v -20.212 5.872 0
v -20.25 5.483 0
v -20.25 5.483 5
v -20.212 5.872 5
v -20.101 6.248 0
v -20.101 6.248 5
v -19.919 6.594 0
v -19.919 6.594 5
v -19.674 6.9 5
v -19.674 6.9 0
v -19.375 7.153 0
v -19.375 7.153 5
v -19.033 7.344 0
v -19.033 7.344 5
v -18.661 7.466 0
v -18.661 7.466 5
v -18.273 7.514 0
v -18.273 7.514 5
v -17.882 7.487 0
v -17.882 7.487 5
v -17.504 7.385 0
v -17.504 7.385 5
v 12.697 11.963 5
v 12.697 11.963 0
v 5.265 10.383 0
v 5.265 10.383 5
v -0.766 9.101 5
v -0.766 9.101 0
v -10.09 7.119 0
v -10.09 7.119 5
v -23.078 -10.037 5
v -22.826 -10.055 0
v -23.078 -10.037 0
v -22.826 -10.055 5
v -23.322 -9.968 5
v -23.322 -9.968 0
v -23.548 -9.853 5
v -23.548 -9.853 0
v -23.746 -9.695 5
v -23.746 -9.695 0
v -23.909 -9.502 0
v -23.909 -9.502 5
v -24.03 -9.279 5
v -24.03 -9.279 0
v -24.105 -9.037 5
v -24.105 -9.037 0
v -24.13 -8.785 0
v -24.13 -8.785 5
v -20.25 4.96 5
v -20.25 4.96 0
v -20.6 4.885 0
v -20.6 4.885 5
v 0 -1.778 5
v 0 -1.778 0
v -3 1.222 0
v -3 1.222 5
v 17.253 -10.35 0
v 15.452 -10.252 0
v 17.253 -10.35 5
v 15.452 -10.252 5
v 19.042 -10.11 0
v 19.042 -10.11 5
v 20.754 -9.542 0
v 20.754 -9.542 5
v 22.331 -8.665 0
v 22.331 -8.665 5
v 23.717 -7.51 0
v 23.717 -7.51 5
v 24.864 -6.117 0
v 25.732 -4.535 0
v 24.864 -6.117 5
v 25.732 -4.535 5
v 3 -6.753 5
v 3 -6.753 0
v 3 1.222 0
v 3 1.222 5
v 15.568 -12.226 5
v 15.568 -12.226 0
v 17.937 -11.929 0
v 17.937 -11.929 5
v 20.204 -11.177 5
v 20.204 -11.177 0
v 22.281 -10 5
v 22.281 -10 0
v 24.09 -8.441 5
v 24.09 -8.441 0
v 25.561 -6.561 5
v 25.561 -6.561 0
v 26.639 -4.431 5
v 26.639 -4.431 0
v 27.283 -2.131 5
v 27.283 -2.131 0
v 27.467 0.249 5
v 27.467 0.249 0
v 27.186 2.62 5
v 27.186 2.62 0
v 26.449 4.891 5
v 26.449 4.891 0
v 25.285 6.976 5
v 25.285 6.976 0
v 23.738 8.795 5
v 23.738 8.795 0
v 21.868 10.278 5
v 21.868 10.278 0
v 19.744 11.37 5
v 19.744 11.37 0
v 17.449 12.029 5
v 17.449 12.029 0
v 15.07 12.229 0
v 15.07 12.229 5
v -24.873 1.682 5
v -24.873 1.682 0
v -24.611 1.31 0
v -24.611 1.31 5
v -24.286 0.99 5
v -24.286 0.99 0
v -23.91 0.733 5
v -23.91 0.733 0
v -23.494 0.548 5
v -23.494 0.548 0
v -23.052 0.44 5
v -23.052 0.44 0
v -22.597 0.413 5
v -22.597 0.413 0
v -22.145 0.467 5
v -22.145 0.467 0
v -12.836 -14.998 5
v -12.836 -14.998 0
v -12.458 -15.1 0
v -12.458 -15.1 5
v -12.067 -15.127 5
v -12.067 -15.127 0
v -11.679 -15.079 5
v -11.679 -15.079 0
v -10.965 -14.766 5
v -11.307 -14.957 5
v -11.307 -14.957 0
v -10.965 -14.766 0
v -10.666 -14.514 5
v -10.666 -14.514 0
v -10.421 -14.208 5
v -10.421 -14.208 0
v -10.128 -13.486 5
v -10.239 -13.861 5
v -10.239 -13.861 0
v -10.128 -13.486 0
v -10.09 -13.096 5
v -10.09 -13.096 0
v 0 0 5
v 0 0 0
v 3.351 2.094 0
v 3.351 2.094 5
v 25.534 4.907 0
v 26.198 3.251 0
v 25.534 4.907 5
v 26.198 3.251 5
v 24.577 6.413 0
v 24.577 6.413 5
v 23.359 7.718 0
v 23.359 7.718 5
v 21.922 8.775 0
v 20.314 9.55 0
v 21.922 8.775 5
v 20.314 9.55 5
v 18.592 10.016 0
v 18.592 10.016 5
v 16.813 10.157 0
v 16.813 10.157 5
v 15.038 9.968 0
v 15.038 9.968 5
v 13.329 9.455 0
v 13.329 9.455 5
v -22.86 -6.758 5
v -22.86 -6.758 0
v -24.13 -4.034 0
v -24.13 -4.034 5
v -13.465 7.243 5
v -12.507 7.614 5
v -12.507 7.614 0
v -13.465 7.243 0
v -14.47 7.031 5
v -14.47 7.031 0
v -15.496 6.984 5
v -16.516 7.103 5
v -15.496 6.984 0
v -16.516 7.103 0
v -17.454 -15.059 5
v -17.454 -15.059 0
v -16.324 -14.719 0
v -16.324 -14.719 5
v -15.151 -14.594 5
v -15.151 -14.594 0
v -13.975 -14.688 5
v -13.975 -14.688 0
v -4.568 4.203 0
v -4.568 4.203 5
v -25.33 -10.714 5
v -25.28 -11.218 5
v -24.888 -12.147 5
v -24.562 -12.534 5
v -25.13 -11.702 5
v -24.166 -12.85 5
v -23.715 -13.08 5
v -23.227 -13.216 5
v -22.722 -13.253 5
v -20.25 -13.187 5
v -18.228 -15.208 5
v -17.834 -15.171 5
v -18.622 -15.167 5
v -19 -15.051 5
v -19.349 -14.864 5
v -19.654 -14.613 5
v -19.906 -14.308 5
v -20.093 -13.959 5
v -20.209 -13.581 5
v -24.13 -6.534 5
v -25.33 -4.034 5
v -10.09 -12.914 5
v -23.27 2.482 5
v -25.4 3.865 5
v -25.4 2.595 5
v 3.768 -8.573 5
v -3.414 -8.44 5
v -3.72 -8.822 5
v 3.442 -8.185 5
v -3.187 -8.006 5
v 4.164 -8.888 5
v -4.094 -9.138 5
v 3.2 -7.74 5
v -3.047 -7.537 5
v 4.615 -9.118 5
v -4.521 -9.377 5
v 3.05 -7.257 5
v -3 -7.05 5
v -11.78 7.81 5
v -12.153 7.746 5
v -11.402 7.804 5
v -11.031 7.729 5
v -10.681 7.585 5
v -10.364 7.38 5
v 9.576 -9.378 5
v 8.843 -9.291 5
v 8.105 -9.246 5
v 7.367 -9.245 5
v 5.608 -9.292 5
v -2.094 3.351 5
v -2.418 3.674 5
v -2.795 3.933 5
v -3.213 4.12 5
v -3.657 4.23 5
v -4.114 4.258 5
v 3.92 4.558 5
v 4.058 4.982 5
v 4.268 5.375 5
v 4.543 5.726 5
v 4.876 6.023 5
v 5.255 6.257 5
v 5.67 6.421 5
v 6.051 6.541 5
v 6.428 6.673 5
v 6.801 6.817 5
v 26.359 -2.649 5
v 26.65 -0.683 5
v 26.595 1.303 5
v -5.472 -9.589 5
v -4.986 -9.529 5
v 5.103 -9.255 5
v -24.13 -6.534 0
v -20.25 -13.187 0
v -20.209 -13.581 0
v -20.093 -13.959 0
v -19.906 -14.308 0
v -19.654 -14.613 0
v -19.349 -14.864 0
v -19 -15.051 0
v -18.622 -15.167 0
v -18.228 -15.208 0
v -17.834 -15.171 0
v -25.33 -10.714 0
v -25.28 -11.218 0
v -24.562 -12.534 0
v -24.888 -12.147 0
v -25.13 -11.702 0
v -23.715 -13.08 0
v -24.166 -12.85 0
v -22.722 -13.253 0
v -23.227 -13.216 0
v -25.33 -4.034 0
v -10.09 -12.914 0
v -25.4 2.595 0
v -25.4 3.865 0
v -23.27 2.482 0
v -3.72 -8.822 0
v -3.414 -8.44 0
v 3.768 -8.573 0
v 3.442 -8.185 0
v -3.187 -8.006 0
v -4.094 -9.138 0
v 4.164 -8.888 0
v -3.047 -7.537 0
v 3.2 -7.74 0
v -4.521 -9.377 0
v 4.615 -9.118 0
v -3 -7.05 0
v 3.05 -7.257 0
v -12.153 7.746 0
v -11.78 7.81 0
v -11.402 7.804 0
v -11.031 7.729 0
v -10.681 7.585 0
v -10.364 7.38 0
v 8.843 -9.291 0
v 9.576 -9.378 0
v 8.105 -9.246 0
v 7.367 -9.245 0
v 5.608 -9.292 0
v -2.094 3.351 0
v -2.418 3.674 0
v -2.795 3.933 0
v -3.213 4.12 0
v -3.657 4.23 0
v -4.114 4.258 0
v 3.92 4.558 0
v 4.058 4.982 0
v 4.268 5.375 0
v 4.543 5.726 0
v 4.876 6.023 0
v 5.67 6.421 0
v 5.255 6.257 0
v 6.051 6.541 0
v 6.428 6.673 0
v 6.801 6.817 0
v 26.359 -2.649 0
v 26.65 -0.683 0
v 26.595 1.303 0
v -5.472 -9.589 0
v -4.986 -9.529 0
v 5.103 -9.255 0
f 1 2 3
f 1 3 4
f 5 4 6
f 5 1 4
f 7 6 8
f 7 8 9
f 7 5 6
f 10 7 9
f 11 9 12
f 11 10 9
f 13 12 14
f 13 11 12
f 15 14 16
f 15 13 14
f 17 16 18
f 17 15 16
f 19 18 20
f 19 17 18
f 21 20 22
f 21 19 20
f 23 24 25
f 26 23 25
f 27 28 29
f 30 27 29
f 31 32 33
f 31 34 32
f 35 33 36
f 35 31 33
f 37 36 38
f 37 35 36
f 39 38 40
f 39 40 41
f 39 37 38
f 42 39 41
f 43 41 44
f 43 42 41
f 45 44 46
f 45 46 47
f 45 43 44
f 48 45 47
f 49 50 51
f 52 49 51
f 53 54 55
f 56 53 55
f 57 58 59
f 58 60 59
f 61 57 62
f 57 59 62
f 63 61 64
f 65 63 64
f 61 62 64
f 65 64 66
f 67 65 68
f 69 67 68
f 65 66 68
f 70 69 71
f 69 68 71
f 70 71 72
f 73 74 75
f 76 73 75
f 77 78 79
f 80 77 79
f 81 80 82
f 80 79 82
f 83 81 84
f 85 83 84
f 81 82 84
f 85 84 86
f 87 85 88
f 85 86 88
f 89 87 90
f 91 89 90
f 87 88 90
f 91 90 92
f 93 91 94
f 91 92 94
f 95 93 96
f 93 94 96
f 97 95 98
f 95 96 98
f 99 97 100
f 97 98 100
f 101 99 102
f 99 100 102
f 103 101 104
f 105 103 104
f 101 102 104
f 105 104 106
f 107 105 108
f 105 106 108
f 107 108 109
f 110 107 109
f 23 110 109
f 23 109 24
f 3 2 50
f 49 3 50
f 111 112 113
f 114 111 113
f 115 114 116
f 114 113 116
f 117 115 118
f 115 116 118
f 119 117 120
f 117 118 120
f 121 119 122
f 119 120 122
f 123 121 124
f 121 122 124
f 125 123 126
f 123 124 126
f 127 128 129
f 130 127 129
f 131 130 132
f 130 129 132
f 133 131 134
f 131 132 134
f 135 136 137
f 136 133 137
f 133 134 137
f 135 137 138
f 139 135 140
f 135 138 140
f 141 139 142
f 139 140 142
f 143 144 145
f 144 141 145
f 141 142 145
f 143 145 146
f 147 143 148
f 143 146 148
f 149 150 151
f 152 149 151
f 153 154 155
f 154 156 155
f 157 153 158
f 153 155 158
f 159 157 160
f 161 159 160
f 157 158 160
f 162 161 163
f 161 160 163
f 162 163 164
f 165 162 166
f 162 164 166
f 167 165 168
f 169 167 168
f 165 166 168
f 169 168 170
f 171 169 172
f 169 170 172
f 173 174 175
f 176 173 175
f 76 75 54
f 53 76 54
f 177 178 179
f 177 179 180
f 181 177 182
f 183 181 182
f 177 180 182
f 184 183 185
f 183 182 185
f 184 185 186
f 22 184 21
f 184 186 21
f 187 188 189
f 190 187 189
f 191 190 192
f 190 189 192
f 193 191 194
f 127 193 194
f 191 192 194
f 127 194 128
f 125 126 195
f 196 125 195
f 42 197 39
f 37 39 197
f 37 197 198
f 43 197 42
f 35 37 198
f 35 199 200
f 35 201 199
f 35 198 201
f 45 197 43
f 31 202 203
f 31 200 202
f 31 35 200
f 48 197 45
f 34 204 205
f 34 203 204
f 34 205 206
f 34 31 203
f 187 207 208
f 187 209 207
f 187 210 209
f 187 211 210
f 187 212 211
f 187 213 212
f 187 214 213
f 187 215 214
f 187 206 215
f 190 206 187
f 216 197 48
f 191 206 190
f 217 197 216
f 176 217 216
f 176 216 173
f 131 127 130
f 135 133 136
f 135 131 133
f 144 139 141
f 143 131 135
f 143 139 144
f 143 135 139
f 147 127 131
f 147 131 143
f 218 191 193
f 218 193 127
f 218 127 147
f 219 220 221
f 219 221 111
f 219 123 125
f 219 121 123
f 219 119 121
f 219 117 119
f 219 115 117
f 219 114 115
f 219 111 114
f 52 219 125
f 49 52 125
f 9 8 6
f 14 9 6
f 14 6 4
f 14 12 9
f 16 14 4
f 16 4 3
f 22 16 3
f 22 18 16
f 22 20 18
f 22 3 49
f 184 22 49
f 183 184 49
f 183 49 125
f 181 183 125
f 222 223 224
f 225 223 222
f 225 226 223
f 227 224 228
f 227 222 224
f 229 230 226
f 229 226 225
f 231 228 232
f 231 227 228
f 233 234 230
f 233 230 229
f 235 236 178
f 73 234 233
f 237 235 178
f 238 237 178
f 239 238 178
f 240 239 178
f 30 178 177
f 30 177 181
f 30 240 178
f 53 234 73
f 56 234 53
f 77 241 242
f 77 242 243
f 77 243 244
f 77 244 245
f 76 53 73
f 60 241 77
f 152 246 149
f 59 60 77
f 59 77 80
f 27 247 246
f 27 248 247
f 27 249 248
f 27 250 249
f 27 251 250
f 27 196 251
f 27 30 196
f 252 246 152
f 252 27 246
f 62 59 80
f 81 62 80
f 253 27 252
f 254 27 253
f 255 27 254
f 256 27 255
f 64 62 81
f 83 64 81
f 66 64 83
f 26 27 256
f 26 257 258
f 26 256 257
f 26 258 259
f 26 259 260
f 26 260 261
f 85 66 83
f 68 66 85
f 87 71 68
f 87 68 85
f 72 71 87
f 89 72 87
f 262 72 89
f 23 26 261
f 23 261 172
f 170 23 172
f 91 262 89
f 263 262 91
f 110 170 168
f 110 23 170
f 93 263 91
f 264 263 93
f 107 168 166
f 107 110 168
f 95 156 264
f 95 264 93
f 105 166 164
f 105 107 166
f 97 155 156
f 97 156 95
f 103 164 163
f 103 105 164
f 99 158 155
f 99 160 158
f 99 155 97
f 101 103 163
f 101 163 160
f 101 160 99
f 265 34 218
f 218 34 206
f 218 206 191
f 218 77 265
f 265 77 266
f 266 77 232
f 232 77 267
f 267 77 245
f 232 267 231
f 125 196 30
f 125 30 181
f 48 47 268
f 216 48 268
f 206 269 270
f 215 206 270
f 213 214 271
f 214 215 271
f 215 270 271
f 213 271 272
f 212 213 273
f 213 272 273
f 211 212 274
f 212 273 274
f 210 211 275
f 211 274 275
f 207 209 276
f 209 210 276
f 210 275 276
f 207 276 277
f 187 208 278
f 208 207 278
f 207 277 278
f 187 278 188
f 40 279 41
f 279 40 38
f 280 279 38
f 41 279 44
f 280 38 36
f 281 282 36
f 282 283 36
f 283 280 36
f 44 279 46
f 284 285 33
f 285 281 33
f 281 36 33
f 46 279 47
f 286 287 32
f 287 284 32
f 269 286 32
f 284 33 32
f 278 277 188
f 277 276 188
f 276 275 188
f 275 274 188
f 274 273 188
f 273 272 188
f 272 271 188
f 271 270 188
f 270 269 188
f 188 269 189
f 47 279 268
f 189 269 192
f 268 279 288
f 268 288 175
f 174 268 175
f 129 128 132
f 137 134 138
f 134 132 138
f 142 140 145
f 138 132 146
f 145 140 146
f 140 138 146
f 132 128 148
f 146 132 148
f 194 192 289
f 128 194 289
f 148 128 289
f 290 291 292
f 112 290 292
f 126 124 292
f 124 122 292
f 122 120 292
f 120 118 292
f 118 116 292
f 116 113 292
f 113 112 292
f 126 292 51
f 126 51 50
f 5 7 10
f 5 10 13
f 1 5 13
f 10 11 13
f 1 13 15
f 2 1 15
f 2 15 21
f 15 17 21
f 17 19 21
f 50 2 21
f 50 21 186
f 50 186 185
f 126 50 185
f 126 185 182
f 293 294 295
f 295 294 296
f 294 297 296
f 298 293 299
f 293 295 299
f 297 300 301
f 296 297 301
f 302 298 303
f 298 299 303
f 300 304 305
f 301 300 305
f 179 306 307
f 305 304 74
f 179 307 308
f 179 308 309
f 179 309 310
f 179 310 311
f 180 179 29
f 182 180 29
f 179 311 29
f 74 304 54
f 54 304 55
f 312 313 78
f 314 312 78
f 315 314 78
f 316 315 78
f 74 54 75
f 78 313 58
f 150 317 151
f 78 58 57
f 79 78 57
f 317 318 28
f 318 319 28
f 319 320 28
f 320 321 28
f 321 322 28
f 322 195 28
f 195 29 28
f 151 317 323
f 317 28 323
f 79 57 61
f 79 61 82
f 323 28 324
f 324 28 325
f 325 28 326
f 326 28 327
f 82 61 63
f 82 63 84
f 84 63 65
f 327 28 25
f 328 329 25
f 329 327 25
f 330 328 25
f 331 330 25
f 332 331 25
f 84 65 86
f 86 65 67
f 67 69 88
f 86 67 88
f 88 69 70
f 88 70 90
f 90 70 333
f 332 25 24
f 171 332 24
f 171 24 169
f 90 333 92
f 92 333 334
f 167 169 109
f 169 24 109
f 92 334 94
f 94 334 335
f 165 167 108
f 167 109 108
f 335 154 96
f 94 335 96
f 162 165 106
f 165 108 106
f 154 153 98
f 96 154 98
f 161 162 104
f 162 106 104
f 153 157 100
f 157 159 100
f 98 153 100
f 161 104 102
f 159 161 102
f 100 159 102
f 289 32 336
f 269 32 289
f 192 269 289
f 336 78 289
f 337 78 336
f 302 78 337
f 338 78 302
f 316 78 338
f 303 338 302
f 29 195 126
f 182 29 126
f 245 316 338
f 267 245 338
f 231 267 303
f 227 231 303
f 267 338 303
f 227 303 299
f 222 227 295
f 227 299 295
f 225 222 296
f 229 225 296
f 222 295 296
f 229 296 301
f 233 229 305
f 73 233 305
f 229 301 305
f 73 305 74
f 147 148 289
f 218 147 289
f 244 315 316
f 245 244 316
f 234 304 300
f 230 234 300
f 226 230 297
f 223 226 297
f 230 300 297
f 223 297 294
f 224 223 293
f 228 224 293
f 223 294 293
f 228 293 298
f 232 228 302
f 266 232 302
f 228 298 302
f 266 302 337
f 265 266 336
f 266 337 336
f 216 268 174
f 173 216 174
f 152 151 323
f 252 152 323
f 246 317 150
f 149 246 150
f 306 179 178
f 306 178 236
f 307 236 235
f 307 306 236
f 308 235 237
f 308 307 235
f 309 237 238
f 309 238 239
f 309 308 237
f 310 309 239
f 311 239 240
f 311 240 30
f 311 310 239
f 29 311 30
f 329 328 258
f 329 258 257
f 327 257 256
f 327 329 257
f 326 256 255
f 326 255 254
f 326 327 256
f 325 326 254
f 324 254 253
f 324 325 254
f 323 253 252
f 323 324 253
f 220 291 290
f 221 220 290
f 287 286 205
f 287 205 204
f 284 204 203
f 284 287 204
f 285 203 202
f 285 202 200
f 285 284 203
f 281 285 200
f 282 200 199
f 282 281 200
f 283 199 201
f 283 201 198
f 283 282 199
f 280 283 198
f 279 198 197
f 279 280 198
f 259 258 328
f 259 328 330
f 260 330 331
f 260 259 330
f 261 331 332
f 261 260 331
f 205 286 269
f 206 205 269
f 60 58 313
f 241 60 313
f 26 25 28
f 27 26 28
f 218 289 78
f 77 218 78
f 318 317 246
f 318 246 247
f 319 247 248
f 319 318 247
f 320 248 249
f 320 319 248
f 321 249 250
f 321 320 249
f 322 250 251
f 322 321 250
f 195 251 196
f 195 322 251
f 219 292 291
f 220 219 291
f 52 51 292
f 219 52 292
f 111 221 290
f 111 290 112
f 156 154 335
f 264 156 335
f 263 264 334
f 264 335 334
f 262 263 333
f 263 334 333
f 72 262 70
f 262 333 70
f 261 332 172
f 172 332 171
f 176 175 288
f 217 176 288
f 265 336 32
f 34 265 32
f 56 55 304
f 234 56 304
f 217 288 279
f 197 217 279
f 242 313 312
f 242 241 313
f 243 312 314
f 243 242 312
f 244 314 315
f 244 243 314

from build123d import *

# Parameters (mm, degrees)
F1_DEPTH     = 5
F2_R         = 12.7
F3_T1_DEPTH  = 5
F3_T3_DEPTH  = 5
F3_T5_DEPTH  = 5
F3_T7_DEPTH  = 5
F3_T9_DEPTH  = 14.2270901057
F3_T11_DEPTH = 18.0454684025
F4_R         = 1.27
F5_R         = 9.652
F6_T1_DEPTH  = 24.5237287856
F6_T3_DEPTH  = 20.8349691576
F6_T5_DEPTH  = 25.4326352389


# Not quite as in the source:
# - a fillet or chamfer that OpenCascade refuses, or shapes differently, is made with other operations: its cross-section is extruded or revolved along the edge and cut away or added


with BuildPart() as f1:
    # F0 (on Top) → F1 (new body)
    with BuildSketch(Plane.XY):
        Polygon((3.3509032068, 2.0938767152), (4.2717468935, 6.0824889279), (5.2645709983, 10.3828825854), (-0.7663700033, 9.1009665025), (-1.7591941081, 4.800572845), (-2.0938767152, 3.3509032068), (0, 0), align=None)
        with BuildLine():
            ThreePointArc((19.0271173058, -10.7843702882), (13.5579507926, -11.3055566189), (8.4773948837, -9.2147746604))
            Line((8.4773948837, -9.2147746604), (3, -9.3617991862))
            Line((3, -9.3617991862), (-3, -9.5228515064))
            Line((-3, -9.5228515064), (-24.13, -10.0900240941))
            Line((-24.13, -10.0900240941), (-24.13, -6.5340240941))
            Line((-24.13, -6.5340240941), (-24.13, -4.0344355705))
            Line((-24.13, -4.0344355705), (-25.33, -4.0344355705))
            Line((-25.33, -4.0344355705), (-25.33, -13.3233871439))
            Line((-25.33, -13.3233871439), (-20.25, -13.1870295128))
            Line((-20.25, -13.1870295128), (-10.09, -12.9143142505))
            Line((-10.09, -12.9143142505), (15.568160115, -12.2255965474))
            ThreePointArc((15.568160115, -12.2255965474), (27.3847553183, 1.4414639293), (12.6972400213, 11.962745157))
            Line((12.6972400213, 11.962745157), (5.2645709983, 10.3828825854))
            Line((5.2645709983, 10.3828825854), (4.2717468935, 6.0824889279))
            Line((4.2717468935, 6.0824889279), (5.7705051289, 6.4010598252))
            ThreePointArc((5.7705051289, 6.4010598252), (10.9582466373, 10.5977114577), (17.6052347625, 11.1826009729))
            ThreePointArc((17.6052347625, 11.1826009729), (26.6461306142, 0.7382983213), (19.0271173058, -10.7843702882))
        make_face()
        Polygon((-24.13, -4.0344355705), (-24.13, -6.5340240941), (-22.86, -6.7579593596), align=None)
        Polygon((-3, -9.5228515064), (3, -9.3617991862), (3, 1.222), (0, -1.778), (-3, 1.222), align=None)
        Polygon((-1.7591941081, 4.800572845), (-0.7663700033, 9.1009665025), (-10.09, 7.1191677681), (-20.25, 4.9595931015), (-20.6003244103, 4.8851293494), (-23.2697767574, 2.48154366), (-25.4, 3.8649268089), (-25.4, 2.5949268089), (-23.9501636865, 0.0837366513), align=None)
        with BuildLine():
            Line((5.7705051289, 6.4010598252), (17.6052347625, 11.1826009729))
            ThreePointArc((17.6052347625, 11.1826009729), (10.9582466373, 10.5977114577), (5.7705051289, 6.4010598252))
        make_face()
        with BuildLine():
            Line((19.0271173058, -10.7843702882), (8.4773948837, -9.2147746604))
            ThreePointArc((8.4773948837, -9.2147746604), (13.5579507926, -11.3055566189), (19.0271173058, -10.7843702882))
        make_face()
        with BuildLine():
            Line((-20.25, 4.9595931015), (-10.09, 7.1191677681))
            Line((-10.09, 7.1191677681), (-10.09, 9.660082633))
            ThreePointArc((-10.09, 9.660082633), (-15.1017802383, 6.9821995552), (-20.25, 9.3873673708))
            Line((-20.25, 9.3873673708), (-20.25, 4.9595931015))
        make_face()
        with BuildLine():
            Line((-10.09, -17.0008412983), (-10.09, -12.9143142505))
            Line((-10.09, -12.9143142505), (-20.25, -13.1870295128))
            Line((-20.25, -13.1870295128), (-20.25, -17.2735565605))
            ThreePointArc((-20.25, -17.2735565605), (-15.2382197617, -14.5956734827), (-10.09, -17.0008412983))
        make_face()
    extrude(amount=F1_DEPTH)

    # F2
    f2_edges = [f1.edges().sort_by_distance(p)[0] for p in [
        (5.770505, 6.40106, 2.5),
        (8.477395, -9.214775, 2.5),
    ]]
    fillet(f2_edges, radius=F2_R)

    # F3: fillet of radius 2.54 on 8 edges, made by hand

    # F3_s2 → F3_t1 (join)
    with BuildSketch(Plane.XY):
        with BuildLine():
            ThreePointArc((5.6695141413, 6.421250807), (4.5433342643, 5.7258928643), (3.9198768127, 4.5583721621))
            Line((3.9198768127, 4.5583721621), (3.6723868163, 4.6155097299))
            Line((3.6723868163, 4.6155097299), (4.024256897, 6.1396264957))
            Line((4.024256897, 6.1396264957), (4.218937324, 6.3309384185))
            ThreePointArc((4.218937324, 6.3309384185), (4.6308698651, 6.4184973831), (5.5969878777, 6.6646762393))
            Line((5.5969878777, 6.6646762393), (5.6695141413, 6.421250807))
        make_face()
    extrude(amount=F3_T1_DEPTH)

    # F3_s4 → F3_t3 (join)
    with BuildSketch(Plane.XY):
        with BuildLine():
            ThreePointArc((-2.0938767152, 3.3509032068), (-3.2128527644, 4.1204303422), (-4.5683542412, 4.2034674259))
            Line((-4.5683542412, 4.2034674259), (-1.7591941081, 4.800572845))
            Line((-1.7591941081, 4.800572845), (-2.0938767152, 3.3509032068))
        make_face()
    extrude(amount=F3_T3_DEPTH)

    # F3_s6 → F3_t5 (join)
    with BuildSketch(Plane.XY):
        with BuildLine():
            ThreePointArc((5.6081542675, -9.2917909701), (3.7682087933, -8.5726933957), (3, -6.7527055057))
            Line((3, -6.7527055057), (3, -9.3617991862))
            Line((3, -9.3617991862), (5.6081542675, -9.2917909701))
        make_face()
    extrude(amount=F3_T5_DEPTH)

    # F3_s8 → F3_t7 (join)
    with BuildSketch(Plane.XY):
        with BuildLine():
            ThreePointArc((-3, -7.050115457), (-3.72001211, -8.8219066637), (-5.4718457325, -9.5892009215))
            Line((-5.4718457325, -9.5892009215), (-3, -9.5228515064))
            Line((-3, -9.5228515064), (-3, -7.050115457))
        make_face()
    extrude(amount=F3_T7_DEPTH)

    # F3_s10 → F3_t9 (cut)
    with BuildSketch(Plane.XY.offset(-4.6135450528)):
        with BuildLine():
            ThreePointArc((-24.872872697, 1.6819155382), (-23.7062792448, 0.6315100757), (-22.1450724768, 0.4674206323))
            Line((-22.1450724768, 0.4674206323), (-23.9501636865, 0.0837366513))
            Line((-23.9501636865, 0.0837366513), (-24.872872697, 1.6819155382))
        make_face()
    extrude(amount=F3_T9_DEPTH, mode=Mode.SUBTRACT)

    # F3_s12 → F3_t11 (cut)
    with BuildSketch(Plane.XY.offset(-6.5227342013)):
        with BuildLine():
            ThreePointArc((-22.7218457325, -13.2533789278), (-24.5617912067, -12.5342813534), (-25.33, -10.7142934634))
            Line((-25.33, -10.7142934634), (-25.33, -13.3233871439))
            Line((-25.33, -13.3233871439), (-22.7218457325, -13.2533789278))
        make_face()
    extrude(amount=F3_T11_DEPTH, mode=Mode.SUBTRACT)

    # F4
    f4_edges = [f1.edges().sort_by_distance(p)[0] for p in [
        (-24.13, -10.090024, 2.5),
    ]]
    fillet(f4_edges, radius=F4_R)

    # F5
    f5_edges = [f1.edges().sort_by_distance(p)[0] for p in [
        (17.605235, 11.182601, 2.5),
        (19.027117, -10.78437, 2.5),
    ]]
    fillet(f5_edges, radius=F5_R)

    # F6: fillet of radius 2.032 on 4 edges, made by hand

    # F6_s2 → F6_t1 (cut)
    with BuildSketch(Plane.XY.offset(-9.7618643928)):
        with BuildLine():
            ThreePointArc((-20.25, 5.4826216137), (-19.3751275367, 7.152974829), (-17.5038584017, 7.3849953356))
            ThreePointArc((-17.5038584017, 7.3849953356), (-19.0133811971, 8.1990450487), (-20.25, 9.3873673708))
            Line((-20.25, 9.3873673708), (-20.25, 5.4826216137))
        make_face()
        with BuildLine():
            ThreePointArc((-12.8361415983, -14.9984692631), (-10.9648724633, -14.7664487565), (-10.09, -13.0960955412))
            Line((-10.09, -13.0960955412), (-10.09, -17.0008412983))
            ThreePointArc((-10.09, -17.0008412983), (-11.3266188029, -15.8125189761), (-12.8361415983, -14.9984692631))
        make_face()
    extrude(amount=F6_T1_DEPTH, mode=Mode.SUBTRACT)

    # F6_s4 → F6_t3 (cut)
    with BuildSketch(Plane.XY.offset(-7.9174845788)):
        with BuildLine():
            ThreePointArc((-12.5069745437, 7.613601755), (-11.2148663887, 7.7751542861), (-10.09, 7.1191677681))
            Line((-10.09, 7.1191677681), (-10.09, 9.660082633))
            ThreePointArc((-10.09, 9.660082633), (-11.1688571334, 8.4837438934), (-12.5069745437, 7.613601755))
        make_face()
    extrude(amount=F6_T3_DEPTH, mode=Mode.SUBTRACT)

    # F6_s6 → F6_t5 (cut)
    with BuildSketch(Plane.XY.offset(-10.2163176194)):
        with BuildLine():
            ThreePointArc((-20.25, -13.1870295128), (-19.3485712422, -14.8643401762), (-17.4543465947, -15.0589111198))
            ThreePointArc((-17.4543465947, -15.0589111198), (-19.0108515696, -15.9659266289), (-20.25, -17.2735565605))
            Line((-20.25, -17.2735565605), (-20.25, -13.1870295128))
        make_face()
    extrude(amount=F6_T5_DEPTH, mode=Mode.SUBTRACT)


solid = f1.part
